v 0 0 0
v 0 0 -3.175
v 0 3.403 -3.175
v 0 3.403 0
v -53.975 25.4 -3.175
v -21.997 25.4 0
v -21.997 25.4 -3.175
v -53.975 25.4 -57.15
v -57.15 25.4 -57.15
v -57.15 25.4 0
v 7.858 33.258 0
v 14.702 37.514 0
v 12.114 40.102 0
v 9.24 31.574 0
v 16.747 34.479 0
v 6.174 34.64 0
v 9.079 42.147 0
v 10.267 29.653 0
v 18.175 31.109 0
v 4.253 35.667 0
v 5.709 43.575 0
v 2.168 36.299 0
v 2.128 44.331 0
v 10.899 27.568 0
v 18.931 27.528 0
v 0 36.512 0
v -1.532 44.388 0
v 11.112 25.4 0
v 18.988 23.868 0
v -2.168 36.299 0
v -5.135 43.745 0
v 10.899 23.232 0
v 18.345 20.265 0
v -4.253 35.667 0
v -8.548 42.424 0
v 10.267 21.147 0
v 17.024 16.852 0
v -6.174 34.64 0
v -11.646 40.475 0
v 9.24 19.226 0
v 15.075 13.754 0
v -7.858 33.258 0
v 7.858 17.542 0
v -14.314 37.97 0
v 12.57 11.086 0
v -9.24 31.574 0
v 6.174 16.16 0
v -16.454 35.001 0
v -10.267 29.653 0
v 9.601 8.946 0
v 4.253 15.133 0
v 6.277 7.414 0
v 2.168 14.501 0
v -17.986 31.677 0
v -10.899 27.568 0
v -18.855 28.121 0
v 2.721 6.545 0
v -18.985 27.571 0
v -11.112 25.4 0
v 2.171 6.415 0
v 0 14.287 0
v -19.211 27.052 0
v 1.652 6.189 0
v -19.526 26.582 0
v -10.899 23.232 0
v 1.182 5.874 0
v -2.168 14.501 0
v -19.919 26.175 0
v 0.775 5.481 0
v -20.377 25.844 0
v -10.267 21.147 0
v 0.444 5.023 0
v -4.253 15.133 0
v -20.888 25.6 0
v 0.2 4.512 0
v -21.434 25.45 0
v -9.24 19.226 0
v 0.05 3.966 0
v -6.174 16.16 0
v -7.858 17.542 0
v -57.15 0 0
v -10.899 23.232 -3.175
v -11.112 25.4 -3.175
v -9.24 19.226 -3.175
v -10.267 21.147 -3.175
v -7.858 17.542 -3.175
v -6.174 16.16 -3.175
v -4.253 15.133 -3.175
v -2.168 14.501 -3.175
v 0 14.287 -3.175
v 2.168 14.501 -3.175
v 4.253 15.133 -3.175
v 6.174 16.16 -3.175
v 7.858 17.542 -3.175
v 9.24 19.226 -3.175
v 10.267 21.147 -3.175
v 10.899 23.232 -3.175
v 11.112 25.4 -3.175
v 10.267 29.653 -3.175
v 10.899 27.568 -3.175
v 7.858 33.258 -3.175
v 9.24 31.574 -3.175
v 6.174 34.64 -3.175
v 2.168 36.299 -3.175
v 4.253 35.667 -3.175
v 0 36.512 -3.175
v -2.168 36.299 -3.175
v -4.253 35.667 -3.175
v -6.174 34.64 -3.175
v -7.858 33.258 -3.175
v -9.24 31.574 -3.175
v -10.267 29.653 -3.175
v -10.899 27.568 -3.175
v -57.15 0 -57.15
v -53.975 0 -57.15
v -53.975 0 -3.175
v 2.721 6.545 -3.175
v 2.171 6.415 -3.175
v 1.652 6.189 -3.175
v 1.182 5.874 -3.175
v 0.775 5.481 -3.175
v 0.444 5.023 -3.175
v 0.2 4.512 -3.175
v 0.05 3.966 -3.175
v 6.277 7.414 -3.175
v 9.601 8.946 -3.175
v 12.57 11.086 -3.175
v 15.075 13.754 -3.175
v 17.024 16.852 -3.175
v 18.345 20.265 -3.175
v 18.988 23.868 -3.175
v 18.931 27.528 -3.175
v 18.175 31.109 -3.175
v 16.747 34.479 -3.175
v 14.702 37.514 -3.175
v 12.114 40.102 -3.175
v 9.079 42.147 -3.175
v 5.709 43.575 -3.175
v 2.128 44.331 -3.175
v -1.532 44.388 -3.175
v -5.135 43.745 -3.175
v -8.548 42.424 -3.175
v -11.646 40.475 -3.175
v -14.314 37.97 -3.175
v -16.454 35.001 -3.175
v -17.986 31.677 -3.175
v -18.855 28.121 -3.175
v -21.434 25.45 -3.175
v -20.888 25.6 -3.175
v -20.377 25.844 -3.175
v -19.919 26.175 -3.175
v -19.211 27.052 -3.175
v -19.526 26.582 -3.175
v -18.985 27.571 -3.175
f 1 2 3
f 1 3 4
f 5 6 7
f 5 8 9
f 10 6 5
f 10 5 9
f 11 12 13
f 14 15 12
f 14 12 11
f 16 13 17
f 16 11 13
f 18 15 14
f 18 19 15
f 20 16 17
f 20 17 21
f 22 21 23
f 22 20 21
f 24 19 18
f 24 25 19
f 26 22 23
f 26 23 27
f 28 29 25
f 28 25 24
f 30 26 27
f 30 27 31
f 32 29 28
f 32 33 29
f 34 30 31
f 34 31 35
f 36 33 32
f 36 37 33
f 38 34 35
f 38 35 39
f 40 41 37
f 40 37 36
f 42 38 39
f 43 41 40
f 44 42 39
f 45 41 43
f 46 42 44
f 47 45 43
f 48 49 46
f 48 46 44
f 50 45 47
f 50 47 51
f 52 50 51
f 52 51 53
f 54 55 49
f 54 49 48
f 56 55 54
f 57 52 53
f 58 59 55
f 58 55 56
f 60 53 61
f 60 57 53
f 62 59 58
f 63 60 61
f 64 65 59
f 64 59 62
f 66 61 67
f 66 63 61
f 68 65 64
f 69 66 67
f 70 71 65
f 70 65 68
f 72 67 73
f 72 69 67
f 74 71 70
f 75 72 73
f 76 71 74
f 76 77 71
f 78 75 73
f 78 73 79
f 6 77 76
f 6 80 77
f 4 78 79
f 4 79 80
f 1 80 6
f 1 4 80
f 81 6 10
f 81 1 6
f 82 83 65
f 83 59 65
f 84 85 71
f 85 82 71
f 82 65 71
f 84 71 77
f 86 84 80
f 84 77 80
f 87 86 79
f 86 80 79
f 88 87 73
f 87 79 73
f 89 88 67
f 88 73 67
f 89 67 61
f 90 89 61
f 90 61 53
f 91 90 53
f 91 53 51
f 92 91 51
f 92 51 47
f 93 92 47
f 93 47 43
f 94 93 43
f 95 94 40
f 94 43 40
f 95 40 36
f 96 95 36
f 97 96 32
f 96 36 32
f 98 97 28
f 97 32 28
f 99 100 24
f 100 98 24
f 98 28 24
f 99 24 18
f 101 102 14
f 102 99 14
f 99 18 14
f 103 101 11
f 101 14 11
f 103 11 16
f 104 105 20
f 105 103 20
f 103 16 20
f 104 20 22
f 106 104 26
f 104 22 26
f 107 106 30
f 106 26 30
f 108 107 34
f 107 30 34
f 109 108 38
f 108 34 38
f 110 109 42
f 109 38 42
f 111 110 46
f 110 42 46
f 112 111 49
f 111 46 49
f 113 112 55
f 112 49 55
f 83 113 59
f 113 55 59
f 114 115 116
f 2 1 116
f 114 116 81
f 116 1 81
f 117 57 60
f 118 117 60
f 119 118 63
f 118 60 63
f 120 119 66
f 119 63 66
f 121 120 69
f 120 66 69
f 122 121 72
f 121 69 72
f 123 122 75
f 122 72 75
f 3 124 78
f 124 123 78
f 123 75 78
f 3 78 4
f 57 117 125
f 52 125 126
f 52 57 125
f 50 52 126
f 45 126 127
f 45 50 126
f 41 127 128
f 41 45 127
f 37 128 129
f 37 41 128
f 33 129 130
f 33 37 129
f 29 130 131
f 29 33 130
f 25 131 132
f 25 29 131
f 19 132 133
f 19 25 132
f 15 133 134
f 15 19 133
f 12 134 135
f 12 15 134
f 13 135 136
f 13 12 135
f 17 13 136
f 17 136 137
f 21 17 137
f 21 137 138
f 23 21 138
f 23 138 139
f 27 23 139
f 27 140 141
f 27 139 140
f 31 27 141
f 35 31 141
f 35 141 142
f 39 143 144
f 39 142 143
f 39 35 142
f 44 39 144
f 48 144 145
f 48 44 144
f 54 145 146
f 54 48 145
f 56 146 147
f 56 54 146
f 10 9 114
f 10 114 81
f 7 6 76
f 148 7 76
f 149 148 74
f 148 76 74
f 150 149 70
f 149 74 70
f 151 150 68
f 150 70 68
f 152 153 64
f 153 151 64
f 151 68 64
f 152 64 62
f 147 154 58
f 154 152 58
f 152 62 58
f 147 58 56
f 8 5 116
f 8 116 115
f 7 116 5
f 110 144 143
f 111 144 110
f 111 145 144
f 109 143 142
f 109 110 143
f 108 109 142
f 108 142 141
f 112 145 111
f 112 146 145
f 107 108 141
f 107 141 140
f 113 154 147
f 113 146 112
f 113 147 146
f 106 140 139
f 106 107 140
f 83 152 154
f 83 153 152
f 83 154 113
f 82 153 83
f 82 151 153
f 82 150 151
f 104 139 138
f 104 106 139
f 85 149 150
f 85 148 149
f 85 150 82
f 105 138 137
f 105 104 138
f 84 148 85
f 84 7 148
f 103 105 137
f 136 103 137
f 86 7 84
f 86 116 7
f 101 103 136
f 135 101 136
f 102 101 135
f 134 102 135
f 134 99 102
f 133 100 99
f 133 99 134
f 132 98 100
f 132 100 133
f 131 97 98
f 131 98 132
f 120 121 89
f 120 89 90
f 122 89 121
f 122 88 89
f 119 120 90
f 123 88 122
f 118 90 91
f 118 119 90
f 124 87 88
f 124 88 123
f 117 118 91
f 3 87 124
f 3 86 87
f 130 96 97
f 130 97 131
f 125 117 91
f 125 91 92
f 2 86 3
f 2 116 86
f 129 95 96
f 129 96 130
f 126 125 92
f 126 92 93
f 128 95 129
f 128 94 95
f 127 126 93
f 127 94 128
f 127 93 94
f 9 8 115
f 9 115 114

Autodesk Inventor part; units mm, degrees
ref_plane "YZ Plane" through (0, 0, 0) normal (1, 0, 0) x (0, 1, 0)
ref_plane "XZ Plane" through (0, 0, 0) normal (0, 1, 0) x (-1, 0, 0)
ref_plane "XY Plane" through (0, 0, 0) normal (0, 0, 1) x (1, 0, 0)
sketch "Sketch1" plane through (0, 0, 0) normal (0, 1, 0) x (-1, 0, 0)
  line L0 (0, 0) -> (57.15, 0)
  line L1 (112.534, 31.2241) -> (58.0687, -3.175)
  line L2 (58.0687, -3.175) -> (0, -3.175)
  line L3 (0, -3.175) -> (0, 0)
  line L4 (110.8385, 33.9086) -> (112.534, 31.2241)
  line L5 (57.15, 0) -> (110.8385, 33.9086)
  dimension "d0" = 3.175
  dimension "d1" = 3.175
  dimension "d3" = 57.15
  dimension "d4" = 63.5
  dimension "d5" = 147.724
extrude "Extrusion1" add sketch "Sketch1" along normal blind 25.4
sketch "Sketch2" plane through (-57.15, 0, 0) normal (0, 0, 1) x (1, 0, 0)
  line L0 (0, 25.4) -> (57.15, 25.4) projected
  circle A0 centre (57.15, 25.4) radius 11.1125
  line L1 (57.15, 0) -> (57.15, 25.4) projected
  circle A1 centre (57.15, 25.4) radius 19.05
  dimension "d8" = 22.225
  dimension "d9" = 38.1
extrude "Extrusion2" add sketch "Sketch2" against normal blind 3.175 contours A1 L1 A0 L0 | L0 A0 L1 A1
sketch "Sketch3" plane through (-57.15, 0, 0) normal (0, 0, 1) x (1, 0, 0)
  line L0 (57.15, 14.2875) -> (57.15, 25.4) projected
  circle A0 centre (57.15, 25.4) radius 11.1125
  point P0 (57.15, 0)
extrude "Extrusion3" cut sketch "Sketch3" against normal blind 3.175
fillet "Fillet1" radius 3.175 2 edges at (0, 6.35, -1.5875) (-19.05, 25.4, -1.5875)
sketch "Sketch4" plane through (0, 25.4, 0) normal (0, 1, 0) x (1, 0, 0)
  line L0 (0, 0) -> (-63.5, 0)
  line L1 (-136.491, 61.8746) -> (-57.15, 61.8746)
  line L2 (-57.15, 61.8746) -> (-57.15, -40.3817)
  line L3 (-57.15, -40.3817) -> (-136.491, -40.3817)
  line L4 (-136.491, -40.3817) -> (-136.491, 61.8746)
  dimension "d15" = 63.5
extrude "Extrusion4" cut sketch "Sketch4" against normal blind 31.75
sketch "Sketch5" plane through (0, 25.4, 0) normal (0, 1, 0) x (1, 0, 0)
  line L0 (0, 0) -> (-57.15, 0)
  line L1 (-57.15, 0) -> (-57.15, 3.175) projected
  line L2 (-57.15, 0) -> (-53.975, 0)
  line L3 (-53.975, 0) -> (-53.975, 57.15)
  line L4 (-53.975, 57.15) -> (-57.15, 57.15)
  line L5 (-57.15, 57.15) -> (-57.15, 0)
  dimension "d18" = 57.15
  dimension "d19" = 3.175
  dimension "d20" = 57.15
extrude "Extrusion5" add sketch "Sketch5" against normal up to surface (25.4 mm away)
properties part number "Pivot Bracket"
